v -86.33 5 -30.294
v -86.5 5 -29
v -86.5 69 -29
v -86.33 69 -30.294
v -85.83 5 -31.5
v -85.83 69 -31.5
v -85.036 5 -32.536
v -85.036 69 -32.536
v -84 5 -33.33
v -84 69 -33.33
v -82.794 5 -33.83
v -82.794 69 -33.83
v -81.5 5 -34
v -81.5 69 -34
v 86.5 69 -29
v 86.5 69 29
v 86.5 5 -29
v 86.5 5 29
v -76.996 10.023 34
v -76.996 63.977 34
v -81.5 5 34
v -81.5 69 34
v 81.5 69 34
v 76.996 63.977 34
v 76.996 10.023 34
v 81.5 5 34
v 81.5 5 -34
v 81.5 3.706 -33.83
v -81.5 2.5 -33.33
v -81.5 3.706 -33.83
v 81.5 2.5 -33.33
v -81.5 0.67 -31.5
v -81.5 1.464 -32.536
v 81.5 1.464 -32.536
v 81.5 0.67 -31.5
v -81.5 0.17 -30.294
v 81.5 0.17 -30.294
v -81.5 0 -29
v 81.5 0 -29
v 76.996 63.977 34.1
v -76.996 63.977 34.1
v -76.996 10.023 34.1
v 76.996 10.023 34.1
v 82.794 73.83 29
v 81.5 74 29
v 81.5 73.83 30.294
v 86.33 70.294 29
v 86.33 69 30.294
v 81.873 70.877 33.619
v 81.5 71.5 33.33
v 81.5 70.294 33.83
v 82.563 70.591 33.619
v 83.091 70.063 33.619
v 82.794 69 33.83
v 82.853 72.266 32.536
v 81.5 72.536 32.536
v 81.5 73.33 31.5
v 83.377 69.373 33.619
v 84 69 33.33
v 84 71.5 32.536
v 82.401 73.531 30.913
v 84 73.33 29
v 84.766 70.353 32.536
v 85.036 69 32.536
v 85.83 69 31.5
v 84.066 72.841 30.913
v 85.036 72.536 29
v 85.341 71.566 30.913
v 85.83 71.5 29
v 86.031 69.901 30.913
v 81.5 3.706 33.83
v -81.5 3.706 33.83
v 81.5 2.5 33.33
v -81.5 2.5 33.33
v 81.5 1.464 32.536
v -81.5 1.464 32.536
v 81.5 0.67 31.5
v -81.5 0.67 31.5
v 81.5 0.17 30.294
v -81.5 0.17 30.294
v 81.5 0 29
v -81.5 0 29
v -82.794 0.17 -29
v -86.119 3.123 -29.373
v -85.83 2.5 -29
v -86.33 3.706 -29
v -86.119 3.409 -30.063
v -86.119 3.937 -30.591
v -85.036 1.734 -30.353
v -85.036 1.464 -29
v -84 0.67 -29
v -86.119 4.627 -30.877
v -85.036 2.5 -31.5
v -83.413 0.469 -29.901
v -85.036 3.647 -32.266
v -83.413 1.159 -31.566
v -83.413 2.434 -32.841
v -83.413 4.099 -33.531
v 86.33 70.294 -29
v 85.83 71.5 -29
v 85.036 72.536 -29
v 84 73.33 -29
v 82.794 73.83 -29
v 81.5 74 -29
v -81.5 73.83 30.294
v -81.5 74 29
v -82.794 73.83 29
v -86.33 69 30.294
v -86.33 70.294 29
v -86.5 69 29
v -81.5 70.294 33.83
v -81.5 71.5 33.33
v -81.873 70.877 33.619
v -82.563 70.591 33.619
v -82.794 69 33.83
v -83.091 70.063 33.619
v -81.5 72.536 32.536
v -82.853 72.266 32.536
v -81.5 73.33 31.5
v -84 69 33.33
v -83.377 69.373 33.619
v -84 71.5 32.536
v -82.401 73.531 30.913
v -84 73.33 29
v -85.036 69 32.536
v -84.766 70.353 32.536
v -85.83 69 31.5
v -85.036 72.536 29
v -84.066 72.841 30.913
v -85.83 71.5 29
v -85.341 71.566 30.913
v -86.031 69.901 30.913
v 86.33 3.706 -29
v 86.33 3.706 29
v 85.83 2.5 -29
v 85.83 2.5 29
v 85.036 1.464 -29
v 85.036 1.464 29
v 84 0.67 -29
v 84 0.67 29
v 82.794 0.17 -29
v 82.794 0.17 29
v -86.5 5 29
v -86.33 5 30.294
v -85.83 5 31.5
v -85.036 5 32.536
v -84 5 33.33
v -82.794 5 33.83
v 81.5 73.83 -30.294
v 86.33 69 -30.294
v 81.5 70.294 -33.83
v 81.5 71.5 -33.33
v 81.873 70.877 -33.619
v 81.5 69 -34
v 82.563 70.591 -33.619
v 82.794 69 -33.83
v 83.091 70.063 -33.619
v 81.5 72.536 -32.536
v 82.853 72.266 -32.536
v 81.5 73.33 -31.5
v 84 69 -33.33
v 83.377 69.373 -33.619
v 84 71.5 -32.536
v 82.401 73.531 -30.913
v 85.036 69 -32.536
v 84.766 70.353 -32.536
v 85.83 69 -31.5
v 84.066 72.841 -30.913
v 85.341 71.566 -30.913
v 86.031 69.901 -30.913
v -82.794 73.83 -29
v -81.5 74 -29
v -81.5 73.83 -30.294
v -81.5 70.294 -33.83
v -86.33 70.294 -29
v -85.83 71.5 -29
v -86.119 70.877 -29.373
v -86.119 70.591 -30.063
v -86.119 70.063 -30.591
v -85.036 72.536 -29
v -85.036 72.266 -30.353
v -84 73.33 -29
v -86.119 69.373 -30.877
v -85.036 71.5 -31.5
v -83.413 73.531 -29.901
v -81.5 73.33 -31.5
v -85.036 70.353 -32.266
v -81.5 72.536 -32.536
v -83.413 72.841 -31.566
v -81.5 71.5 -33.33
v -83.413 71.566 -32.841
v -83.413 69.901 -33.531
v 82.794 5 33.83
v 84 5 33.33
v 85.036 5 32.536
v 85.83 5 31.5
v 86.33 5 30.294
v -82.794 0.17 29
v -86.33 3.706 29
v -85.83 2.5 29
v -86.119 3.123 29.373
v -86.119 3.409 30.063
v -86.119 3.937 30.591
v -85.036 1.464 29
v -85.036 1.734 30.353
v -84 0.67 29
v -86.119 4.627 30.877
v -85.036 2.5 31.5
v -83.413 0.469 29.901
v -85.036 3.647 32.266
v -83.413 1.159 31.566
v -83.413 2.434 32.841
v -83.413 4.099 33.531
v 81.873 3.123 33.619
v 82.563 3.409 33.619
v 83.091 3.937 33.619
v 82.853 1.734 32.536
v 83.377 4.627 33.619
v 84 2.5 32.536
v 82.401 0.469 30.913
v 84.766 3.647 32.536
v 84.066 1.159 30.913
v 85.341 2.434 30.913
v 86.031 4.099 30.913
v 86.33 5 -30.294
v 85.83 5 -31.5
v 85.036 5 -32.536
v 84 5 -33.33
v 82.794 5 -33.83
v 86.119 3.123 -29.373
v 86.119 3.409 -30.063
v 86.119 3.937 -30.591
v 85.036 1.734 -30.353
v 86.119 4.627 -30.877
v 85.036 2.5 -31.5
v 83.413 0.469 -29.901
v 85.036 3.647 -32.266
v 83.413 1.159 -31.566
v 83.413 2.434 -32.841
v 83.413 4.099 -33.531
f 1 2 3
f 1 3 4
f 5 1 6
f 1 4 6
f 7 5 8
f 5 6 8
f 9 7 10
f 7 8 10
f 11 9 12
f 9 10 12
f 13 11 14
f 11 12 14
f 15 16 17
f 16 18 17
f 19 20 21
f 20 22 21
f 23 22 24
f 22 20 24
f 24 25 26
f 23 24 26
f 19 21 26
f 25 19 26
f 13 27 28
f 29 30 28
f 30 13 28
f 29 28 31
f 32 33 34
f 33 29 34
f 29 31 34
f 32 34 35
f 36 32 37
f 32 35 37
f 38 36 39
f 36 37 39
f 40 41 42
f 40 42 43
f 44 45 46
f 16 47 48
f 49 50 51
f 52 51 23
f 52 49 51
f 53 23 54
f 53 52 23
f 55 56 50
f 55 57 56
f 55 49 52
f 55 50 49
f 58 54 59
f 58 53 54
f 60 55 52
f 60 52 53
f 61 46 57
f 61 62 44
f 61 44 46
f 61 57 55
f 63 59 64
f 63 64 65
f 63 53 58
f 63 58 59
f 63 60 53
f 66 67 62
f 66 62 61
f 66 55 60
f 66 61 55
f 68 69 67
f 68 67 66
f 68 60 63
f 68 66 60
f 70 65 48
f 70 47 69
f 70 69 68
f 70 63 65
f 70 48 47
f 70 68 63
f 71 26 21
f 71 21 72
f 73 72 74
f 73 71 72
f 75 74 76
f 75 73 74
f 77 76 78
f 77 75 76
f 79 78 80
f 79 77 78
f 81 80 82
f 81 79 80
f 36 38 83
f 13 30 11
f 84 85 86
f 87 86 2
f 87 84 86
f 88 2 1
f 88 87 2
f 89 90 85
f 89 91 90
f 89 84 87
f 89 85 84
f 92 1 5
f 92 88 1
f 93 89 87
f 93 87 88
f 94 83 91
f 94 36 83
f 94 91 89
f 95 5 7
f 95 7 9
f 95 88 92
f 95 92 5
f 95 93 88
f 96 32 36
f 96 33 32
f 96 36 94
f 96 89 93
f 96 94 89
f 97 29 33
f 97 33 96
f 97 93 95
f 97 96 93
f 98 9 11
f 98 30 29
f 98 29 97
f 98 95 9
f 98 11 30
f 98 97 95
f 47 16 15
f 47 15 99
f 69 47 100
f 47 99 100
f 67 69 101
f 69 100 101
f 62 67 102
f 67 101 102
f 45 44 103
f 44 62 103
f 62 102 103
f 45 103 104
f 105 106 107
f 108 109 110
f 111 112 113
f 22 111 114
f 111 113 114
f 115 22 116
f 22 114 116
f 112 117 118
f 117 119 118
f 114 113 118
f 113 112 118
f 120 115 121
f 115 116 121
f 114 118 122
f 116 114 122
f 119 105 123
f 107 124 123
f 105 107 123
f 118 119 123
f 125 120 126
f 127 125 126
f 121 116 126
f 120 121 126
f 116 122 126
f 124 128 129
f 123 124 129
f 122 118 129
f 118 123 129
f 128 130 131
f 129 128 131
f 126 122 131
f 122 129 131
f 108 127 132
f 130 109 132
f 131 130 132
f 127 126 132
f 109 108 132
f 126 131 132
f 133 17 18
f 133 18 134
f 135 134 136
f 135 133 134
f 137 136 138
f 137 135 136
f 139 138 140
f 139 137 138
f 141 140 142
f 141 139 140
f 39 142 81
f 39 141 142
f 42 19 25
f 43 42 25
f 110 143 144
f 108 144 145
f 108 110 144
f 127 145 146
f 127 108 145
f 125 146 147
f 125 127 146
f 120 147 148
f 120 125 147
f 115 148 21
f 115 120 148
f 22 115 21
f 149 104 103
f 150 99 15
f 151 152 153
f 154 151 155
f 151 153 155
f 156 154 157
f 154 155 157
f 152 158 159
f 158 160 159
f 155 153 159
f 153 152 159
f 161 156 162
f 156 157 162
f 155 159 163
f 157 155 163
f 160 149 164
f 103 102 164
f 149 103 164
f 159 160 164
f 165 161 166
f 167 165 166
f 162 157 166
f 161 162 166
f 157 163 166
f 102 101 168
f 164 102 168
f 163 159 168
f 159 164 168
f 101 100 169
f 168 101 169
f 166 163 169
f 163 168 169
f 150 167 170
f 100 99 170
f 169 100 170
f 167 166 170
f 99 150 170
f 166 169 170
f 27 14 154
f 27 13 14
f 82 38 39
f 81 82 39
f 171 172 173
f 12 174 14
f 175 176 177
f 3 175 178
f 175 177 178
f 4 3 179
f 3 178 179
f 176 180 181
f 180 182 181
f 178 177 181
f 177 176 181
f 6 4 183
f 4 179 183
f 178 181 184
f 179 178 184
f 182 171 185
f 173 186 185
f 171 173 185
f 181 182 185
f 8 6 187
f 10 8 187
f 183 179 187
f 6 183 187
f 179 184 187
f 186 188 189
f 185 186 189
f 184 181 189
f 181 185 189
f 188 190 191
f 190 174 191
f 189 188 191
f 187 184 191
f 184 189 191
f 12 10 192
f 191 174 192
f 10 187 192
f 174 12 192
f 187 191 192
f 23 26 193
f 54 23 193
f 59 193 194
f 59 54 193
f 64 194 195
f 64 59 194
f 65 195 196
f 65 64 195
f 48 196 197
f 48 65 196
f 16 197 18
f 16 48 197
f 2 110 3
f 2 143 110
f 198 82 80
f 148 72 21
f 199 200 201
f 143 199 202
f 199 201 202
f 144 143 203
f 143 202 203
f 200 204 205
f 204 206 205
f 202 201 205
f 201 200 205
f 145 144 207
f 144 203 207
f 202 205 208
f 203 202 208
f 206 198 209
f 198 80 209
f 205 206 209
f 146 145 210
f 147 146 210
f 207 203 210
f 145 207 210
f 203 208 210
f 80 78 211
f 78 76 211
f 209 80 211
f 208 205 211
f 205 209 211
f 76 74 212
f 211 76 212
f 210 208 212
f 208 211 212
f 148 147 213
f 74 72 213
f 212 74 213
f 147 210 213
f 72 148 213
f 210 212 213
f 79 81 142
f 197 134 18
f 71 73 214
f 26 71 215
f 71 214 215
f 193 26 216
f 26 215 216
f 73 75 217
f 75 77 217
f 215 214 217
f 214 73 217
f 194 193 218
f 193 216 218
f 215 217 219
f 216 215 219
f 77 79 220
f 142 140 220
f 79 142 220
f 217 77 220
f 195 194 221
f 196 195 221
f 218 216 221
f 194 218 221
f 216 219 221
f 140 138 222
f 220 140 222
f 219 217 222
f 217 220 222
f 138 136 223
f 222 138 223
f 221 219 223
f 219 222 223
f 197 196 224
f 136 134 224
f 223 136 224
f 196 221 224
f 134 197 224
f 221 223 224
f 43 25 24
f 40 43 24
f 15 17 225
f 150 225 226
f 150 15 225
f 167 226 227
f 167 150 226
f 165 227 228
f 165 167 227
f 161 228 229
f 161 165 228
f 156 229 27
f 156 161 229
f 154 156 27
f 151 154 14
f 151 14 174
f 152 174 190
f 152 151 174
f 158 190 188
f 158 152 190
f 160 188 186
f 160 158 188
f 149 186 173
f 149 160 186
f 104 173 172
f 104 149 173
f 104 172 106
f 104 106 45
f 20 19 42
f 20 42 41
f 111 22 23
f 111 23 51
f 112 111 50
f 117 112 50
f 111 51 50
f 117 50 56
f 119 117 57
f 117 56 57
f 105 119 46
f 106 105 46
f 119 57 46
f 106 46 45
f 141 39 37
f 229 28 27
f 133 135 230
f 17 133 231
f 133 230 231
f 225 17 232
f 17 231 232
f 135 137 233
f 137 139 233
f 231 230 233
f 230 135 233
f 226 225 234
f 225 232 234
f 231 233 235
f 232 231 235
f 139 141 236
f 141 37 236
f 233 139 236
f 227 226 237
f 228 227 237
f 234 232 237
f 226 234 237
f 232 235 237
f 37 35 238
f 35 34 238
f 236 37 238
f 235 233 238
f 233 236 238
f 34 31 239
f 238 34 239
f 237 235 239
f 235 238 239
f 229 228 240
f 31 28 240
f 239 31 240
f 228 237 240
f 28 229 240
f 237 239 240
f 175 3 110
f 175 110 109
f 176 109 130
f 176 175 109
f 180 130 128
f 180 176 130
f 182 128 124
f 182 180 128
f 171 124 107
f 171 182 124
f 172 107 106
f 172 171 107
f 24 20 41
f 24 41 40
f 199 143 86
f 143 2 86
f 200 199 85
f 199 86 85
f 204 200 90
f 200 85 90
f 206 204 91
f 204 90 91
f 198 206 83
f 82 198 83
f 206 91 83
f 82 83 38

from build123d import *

# Parameters (mm, degrees)
SKETCH1_W           = 173
SKETCH1_H           = 68
BOSS_EXTRUDE1_DEPTH = 74
FILLET1_R           = 5
SKETCH2_W           = 153.991614826
SKETCH2_H           = 53.954463554
BOSS_EXTRUDE2_DEPTH = 0.1


with BuildPart() as part:
    # Sketch1 → Boss-Extrude1 (new body)
    with BuildSketch(Plane(origin=(0, 0, 0), x_dir=(1, 0, 0), z_dir=(0, 1, 0))):
        Rectangle(SKETCH1_W, SKETCH1_H)
    extrude(amount=BOSS_EXTRUDE1_DEPTH)

    # Fillet1
    fillet1_edges = [part.edges().sort_by_distance(p)[0] for p in [
        (86.5, 74, 0),
        (0, 74, -34),
        (-86.5, 74, 0),
        (0, 0, -34),
        (86.5, 0, 0),
        (0, 0, 34),
        (-86.5, 0, 0),
        (0, 74, 34),
        (-86.5, 37, -34),
        (86.5, 37, -34),
        (86.5, 37, 34),
        (-86.5, 37, 34),
    ]]
    fillet(fillet1_edges, radius=FILLET1_R)

    # Sketch2 → Boss-Extrude2 (add)
    with BuildSketch(Plane.XY.offset(34)):
        with Locations((0, 37)):
            Rectangle(SKETCH2_W, SKETCH2_H)
    extrude(amount=BOSS_EXTRUDE2_DEPTH)


solid = part.part
